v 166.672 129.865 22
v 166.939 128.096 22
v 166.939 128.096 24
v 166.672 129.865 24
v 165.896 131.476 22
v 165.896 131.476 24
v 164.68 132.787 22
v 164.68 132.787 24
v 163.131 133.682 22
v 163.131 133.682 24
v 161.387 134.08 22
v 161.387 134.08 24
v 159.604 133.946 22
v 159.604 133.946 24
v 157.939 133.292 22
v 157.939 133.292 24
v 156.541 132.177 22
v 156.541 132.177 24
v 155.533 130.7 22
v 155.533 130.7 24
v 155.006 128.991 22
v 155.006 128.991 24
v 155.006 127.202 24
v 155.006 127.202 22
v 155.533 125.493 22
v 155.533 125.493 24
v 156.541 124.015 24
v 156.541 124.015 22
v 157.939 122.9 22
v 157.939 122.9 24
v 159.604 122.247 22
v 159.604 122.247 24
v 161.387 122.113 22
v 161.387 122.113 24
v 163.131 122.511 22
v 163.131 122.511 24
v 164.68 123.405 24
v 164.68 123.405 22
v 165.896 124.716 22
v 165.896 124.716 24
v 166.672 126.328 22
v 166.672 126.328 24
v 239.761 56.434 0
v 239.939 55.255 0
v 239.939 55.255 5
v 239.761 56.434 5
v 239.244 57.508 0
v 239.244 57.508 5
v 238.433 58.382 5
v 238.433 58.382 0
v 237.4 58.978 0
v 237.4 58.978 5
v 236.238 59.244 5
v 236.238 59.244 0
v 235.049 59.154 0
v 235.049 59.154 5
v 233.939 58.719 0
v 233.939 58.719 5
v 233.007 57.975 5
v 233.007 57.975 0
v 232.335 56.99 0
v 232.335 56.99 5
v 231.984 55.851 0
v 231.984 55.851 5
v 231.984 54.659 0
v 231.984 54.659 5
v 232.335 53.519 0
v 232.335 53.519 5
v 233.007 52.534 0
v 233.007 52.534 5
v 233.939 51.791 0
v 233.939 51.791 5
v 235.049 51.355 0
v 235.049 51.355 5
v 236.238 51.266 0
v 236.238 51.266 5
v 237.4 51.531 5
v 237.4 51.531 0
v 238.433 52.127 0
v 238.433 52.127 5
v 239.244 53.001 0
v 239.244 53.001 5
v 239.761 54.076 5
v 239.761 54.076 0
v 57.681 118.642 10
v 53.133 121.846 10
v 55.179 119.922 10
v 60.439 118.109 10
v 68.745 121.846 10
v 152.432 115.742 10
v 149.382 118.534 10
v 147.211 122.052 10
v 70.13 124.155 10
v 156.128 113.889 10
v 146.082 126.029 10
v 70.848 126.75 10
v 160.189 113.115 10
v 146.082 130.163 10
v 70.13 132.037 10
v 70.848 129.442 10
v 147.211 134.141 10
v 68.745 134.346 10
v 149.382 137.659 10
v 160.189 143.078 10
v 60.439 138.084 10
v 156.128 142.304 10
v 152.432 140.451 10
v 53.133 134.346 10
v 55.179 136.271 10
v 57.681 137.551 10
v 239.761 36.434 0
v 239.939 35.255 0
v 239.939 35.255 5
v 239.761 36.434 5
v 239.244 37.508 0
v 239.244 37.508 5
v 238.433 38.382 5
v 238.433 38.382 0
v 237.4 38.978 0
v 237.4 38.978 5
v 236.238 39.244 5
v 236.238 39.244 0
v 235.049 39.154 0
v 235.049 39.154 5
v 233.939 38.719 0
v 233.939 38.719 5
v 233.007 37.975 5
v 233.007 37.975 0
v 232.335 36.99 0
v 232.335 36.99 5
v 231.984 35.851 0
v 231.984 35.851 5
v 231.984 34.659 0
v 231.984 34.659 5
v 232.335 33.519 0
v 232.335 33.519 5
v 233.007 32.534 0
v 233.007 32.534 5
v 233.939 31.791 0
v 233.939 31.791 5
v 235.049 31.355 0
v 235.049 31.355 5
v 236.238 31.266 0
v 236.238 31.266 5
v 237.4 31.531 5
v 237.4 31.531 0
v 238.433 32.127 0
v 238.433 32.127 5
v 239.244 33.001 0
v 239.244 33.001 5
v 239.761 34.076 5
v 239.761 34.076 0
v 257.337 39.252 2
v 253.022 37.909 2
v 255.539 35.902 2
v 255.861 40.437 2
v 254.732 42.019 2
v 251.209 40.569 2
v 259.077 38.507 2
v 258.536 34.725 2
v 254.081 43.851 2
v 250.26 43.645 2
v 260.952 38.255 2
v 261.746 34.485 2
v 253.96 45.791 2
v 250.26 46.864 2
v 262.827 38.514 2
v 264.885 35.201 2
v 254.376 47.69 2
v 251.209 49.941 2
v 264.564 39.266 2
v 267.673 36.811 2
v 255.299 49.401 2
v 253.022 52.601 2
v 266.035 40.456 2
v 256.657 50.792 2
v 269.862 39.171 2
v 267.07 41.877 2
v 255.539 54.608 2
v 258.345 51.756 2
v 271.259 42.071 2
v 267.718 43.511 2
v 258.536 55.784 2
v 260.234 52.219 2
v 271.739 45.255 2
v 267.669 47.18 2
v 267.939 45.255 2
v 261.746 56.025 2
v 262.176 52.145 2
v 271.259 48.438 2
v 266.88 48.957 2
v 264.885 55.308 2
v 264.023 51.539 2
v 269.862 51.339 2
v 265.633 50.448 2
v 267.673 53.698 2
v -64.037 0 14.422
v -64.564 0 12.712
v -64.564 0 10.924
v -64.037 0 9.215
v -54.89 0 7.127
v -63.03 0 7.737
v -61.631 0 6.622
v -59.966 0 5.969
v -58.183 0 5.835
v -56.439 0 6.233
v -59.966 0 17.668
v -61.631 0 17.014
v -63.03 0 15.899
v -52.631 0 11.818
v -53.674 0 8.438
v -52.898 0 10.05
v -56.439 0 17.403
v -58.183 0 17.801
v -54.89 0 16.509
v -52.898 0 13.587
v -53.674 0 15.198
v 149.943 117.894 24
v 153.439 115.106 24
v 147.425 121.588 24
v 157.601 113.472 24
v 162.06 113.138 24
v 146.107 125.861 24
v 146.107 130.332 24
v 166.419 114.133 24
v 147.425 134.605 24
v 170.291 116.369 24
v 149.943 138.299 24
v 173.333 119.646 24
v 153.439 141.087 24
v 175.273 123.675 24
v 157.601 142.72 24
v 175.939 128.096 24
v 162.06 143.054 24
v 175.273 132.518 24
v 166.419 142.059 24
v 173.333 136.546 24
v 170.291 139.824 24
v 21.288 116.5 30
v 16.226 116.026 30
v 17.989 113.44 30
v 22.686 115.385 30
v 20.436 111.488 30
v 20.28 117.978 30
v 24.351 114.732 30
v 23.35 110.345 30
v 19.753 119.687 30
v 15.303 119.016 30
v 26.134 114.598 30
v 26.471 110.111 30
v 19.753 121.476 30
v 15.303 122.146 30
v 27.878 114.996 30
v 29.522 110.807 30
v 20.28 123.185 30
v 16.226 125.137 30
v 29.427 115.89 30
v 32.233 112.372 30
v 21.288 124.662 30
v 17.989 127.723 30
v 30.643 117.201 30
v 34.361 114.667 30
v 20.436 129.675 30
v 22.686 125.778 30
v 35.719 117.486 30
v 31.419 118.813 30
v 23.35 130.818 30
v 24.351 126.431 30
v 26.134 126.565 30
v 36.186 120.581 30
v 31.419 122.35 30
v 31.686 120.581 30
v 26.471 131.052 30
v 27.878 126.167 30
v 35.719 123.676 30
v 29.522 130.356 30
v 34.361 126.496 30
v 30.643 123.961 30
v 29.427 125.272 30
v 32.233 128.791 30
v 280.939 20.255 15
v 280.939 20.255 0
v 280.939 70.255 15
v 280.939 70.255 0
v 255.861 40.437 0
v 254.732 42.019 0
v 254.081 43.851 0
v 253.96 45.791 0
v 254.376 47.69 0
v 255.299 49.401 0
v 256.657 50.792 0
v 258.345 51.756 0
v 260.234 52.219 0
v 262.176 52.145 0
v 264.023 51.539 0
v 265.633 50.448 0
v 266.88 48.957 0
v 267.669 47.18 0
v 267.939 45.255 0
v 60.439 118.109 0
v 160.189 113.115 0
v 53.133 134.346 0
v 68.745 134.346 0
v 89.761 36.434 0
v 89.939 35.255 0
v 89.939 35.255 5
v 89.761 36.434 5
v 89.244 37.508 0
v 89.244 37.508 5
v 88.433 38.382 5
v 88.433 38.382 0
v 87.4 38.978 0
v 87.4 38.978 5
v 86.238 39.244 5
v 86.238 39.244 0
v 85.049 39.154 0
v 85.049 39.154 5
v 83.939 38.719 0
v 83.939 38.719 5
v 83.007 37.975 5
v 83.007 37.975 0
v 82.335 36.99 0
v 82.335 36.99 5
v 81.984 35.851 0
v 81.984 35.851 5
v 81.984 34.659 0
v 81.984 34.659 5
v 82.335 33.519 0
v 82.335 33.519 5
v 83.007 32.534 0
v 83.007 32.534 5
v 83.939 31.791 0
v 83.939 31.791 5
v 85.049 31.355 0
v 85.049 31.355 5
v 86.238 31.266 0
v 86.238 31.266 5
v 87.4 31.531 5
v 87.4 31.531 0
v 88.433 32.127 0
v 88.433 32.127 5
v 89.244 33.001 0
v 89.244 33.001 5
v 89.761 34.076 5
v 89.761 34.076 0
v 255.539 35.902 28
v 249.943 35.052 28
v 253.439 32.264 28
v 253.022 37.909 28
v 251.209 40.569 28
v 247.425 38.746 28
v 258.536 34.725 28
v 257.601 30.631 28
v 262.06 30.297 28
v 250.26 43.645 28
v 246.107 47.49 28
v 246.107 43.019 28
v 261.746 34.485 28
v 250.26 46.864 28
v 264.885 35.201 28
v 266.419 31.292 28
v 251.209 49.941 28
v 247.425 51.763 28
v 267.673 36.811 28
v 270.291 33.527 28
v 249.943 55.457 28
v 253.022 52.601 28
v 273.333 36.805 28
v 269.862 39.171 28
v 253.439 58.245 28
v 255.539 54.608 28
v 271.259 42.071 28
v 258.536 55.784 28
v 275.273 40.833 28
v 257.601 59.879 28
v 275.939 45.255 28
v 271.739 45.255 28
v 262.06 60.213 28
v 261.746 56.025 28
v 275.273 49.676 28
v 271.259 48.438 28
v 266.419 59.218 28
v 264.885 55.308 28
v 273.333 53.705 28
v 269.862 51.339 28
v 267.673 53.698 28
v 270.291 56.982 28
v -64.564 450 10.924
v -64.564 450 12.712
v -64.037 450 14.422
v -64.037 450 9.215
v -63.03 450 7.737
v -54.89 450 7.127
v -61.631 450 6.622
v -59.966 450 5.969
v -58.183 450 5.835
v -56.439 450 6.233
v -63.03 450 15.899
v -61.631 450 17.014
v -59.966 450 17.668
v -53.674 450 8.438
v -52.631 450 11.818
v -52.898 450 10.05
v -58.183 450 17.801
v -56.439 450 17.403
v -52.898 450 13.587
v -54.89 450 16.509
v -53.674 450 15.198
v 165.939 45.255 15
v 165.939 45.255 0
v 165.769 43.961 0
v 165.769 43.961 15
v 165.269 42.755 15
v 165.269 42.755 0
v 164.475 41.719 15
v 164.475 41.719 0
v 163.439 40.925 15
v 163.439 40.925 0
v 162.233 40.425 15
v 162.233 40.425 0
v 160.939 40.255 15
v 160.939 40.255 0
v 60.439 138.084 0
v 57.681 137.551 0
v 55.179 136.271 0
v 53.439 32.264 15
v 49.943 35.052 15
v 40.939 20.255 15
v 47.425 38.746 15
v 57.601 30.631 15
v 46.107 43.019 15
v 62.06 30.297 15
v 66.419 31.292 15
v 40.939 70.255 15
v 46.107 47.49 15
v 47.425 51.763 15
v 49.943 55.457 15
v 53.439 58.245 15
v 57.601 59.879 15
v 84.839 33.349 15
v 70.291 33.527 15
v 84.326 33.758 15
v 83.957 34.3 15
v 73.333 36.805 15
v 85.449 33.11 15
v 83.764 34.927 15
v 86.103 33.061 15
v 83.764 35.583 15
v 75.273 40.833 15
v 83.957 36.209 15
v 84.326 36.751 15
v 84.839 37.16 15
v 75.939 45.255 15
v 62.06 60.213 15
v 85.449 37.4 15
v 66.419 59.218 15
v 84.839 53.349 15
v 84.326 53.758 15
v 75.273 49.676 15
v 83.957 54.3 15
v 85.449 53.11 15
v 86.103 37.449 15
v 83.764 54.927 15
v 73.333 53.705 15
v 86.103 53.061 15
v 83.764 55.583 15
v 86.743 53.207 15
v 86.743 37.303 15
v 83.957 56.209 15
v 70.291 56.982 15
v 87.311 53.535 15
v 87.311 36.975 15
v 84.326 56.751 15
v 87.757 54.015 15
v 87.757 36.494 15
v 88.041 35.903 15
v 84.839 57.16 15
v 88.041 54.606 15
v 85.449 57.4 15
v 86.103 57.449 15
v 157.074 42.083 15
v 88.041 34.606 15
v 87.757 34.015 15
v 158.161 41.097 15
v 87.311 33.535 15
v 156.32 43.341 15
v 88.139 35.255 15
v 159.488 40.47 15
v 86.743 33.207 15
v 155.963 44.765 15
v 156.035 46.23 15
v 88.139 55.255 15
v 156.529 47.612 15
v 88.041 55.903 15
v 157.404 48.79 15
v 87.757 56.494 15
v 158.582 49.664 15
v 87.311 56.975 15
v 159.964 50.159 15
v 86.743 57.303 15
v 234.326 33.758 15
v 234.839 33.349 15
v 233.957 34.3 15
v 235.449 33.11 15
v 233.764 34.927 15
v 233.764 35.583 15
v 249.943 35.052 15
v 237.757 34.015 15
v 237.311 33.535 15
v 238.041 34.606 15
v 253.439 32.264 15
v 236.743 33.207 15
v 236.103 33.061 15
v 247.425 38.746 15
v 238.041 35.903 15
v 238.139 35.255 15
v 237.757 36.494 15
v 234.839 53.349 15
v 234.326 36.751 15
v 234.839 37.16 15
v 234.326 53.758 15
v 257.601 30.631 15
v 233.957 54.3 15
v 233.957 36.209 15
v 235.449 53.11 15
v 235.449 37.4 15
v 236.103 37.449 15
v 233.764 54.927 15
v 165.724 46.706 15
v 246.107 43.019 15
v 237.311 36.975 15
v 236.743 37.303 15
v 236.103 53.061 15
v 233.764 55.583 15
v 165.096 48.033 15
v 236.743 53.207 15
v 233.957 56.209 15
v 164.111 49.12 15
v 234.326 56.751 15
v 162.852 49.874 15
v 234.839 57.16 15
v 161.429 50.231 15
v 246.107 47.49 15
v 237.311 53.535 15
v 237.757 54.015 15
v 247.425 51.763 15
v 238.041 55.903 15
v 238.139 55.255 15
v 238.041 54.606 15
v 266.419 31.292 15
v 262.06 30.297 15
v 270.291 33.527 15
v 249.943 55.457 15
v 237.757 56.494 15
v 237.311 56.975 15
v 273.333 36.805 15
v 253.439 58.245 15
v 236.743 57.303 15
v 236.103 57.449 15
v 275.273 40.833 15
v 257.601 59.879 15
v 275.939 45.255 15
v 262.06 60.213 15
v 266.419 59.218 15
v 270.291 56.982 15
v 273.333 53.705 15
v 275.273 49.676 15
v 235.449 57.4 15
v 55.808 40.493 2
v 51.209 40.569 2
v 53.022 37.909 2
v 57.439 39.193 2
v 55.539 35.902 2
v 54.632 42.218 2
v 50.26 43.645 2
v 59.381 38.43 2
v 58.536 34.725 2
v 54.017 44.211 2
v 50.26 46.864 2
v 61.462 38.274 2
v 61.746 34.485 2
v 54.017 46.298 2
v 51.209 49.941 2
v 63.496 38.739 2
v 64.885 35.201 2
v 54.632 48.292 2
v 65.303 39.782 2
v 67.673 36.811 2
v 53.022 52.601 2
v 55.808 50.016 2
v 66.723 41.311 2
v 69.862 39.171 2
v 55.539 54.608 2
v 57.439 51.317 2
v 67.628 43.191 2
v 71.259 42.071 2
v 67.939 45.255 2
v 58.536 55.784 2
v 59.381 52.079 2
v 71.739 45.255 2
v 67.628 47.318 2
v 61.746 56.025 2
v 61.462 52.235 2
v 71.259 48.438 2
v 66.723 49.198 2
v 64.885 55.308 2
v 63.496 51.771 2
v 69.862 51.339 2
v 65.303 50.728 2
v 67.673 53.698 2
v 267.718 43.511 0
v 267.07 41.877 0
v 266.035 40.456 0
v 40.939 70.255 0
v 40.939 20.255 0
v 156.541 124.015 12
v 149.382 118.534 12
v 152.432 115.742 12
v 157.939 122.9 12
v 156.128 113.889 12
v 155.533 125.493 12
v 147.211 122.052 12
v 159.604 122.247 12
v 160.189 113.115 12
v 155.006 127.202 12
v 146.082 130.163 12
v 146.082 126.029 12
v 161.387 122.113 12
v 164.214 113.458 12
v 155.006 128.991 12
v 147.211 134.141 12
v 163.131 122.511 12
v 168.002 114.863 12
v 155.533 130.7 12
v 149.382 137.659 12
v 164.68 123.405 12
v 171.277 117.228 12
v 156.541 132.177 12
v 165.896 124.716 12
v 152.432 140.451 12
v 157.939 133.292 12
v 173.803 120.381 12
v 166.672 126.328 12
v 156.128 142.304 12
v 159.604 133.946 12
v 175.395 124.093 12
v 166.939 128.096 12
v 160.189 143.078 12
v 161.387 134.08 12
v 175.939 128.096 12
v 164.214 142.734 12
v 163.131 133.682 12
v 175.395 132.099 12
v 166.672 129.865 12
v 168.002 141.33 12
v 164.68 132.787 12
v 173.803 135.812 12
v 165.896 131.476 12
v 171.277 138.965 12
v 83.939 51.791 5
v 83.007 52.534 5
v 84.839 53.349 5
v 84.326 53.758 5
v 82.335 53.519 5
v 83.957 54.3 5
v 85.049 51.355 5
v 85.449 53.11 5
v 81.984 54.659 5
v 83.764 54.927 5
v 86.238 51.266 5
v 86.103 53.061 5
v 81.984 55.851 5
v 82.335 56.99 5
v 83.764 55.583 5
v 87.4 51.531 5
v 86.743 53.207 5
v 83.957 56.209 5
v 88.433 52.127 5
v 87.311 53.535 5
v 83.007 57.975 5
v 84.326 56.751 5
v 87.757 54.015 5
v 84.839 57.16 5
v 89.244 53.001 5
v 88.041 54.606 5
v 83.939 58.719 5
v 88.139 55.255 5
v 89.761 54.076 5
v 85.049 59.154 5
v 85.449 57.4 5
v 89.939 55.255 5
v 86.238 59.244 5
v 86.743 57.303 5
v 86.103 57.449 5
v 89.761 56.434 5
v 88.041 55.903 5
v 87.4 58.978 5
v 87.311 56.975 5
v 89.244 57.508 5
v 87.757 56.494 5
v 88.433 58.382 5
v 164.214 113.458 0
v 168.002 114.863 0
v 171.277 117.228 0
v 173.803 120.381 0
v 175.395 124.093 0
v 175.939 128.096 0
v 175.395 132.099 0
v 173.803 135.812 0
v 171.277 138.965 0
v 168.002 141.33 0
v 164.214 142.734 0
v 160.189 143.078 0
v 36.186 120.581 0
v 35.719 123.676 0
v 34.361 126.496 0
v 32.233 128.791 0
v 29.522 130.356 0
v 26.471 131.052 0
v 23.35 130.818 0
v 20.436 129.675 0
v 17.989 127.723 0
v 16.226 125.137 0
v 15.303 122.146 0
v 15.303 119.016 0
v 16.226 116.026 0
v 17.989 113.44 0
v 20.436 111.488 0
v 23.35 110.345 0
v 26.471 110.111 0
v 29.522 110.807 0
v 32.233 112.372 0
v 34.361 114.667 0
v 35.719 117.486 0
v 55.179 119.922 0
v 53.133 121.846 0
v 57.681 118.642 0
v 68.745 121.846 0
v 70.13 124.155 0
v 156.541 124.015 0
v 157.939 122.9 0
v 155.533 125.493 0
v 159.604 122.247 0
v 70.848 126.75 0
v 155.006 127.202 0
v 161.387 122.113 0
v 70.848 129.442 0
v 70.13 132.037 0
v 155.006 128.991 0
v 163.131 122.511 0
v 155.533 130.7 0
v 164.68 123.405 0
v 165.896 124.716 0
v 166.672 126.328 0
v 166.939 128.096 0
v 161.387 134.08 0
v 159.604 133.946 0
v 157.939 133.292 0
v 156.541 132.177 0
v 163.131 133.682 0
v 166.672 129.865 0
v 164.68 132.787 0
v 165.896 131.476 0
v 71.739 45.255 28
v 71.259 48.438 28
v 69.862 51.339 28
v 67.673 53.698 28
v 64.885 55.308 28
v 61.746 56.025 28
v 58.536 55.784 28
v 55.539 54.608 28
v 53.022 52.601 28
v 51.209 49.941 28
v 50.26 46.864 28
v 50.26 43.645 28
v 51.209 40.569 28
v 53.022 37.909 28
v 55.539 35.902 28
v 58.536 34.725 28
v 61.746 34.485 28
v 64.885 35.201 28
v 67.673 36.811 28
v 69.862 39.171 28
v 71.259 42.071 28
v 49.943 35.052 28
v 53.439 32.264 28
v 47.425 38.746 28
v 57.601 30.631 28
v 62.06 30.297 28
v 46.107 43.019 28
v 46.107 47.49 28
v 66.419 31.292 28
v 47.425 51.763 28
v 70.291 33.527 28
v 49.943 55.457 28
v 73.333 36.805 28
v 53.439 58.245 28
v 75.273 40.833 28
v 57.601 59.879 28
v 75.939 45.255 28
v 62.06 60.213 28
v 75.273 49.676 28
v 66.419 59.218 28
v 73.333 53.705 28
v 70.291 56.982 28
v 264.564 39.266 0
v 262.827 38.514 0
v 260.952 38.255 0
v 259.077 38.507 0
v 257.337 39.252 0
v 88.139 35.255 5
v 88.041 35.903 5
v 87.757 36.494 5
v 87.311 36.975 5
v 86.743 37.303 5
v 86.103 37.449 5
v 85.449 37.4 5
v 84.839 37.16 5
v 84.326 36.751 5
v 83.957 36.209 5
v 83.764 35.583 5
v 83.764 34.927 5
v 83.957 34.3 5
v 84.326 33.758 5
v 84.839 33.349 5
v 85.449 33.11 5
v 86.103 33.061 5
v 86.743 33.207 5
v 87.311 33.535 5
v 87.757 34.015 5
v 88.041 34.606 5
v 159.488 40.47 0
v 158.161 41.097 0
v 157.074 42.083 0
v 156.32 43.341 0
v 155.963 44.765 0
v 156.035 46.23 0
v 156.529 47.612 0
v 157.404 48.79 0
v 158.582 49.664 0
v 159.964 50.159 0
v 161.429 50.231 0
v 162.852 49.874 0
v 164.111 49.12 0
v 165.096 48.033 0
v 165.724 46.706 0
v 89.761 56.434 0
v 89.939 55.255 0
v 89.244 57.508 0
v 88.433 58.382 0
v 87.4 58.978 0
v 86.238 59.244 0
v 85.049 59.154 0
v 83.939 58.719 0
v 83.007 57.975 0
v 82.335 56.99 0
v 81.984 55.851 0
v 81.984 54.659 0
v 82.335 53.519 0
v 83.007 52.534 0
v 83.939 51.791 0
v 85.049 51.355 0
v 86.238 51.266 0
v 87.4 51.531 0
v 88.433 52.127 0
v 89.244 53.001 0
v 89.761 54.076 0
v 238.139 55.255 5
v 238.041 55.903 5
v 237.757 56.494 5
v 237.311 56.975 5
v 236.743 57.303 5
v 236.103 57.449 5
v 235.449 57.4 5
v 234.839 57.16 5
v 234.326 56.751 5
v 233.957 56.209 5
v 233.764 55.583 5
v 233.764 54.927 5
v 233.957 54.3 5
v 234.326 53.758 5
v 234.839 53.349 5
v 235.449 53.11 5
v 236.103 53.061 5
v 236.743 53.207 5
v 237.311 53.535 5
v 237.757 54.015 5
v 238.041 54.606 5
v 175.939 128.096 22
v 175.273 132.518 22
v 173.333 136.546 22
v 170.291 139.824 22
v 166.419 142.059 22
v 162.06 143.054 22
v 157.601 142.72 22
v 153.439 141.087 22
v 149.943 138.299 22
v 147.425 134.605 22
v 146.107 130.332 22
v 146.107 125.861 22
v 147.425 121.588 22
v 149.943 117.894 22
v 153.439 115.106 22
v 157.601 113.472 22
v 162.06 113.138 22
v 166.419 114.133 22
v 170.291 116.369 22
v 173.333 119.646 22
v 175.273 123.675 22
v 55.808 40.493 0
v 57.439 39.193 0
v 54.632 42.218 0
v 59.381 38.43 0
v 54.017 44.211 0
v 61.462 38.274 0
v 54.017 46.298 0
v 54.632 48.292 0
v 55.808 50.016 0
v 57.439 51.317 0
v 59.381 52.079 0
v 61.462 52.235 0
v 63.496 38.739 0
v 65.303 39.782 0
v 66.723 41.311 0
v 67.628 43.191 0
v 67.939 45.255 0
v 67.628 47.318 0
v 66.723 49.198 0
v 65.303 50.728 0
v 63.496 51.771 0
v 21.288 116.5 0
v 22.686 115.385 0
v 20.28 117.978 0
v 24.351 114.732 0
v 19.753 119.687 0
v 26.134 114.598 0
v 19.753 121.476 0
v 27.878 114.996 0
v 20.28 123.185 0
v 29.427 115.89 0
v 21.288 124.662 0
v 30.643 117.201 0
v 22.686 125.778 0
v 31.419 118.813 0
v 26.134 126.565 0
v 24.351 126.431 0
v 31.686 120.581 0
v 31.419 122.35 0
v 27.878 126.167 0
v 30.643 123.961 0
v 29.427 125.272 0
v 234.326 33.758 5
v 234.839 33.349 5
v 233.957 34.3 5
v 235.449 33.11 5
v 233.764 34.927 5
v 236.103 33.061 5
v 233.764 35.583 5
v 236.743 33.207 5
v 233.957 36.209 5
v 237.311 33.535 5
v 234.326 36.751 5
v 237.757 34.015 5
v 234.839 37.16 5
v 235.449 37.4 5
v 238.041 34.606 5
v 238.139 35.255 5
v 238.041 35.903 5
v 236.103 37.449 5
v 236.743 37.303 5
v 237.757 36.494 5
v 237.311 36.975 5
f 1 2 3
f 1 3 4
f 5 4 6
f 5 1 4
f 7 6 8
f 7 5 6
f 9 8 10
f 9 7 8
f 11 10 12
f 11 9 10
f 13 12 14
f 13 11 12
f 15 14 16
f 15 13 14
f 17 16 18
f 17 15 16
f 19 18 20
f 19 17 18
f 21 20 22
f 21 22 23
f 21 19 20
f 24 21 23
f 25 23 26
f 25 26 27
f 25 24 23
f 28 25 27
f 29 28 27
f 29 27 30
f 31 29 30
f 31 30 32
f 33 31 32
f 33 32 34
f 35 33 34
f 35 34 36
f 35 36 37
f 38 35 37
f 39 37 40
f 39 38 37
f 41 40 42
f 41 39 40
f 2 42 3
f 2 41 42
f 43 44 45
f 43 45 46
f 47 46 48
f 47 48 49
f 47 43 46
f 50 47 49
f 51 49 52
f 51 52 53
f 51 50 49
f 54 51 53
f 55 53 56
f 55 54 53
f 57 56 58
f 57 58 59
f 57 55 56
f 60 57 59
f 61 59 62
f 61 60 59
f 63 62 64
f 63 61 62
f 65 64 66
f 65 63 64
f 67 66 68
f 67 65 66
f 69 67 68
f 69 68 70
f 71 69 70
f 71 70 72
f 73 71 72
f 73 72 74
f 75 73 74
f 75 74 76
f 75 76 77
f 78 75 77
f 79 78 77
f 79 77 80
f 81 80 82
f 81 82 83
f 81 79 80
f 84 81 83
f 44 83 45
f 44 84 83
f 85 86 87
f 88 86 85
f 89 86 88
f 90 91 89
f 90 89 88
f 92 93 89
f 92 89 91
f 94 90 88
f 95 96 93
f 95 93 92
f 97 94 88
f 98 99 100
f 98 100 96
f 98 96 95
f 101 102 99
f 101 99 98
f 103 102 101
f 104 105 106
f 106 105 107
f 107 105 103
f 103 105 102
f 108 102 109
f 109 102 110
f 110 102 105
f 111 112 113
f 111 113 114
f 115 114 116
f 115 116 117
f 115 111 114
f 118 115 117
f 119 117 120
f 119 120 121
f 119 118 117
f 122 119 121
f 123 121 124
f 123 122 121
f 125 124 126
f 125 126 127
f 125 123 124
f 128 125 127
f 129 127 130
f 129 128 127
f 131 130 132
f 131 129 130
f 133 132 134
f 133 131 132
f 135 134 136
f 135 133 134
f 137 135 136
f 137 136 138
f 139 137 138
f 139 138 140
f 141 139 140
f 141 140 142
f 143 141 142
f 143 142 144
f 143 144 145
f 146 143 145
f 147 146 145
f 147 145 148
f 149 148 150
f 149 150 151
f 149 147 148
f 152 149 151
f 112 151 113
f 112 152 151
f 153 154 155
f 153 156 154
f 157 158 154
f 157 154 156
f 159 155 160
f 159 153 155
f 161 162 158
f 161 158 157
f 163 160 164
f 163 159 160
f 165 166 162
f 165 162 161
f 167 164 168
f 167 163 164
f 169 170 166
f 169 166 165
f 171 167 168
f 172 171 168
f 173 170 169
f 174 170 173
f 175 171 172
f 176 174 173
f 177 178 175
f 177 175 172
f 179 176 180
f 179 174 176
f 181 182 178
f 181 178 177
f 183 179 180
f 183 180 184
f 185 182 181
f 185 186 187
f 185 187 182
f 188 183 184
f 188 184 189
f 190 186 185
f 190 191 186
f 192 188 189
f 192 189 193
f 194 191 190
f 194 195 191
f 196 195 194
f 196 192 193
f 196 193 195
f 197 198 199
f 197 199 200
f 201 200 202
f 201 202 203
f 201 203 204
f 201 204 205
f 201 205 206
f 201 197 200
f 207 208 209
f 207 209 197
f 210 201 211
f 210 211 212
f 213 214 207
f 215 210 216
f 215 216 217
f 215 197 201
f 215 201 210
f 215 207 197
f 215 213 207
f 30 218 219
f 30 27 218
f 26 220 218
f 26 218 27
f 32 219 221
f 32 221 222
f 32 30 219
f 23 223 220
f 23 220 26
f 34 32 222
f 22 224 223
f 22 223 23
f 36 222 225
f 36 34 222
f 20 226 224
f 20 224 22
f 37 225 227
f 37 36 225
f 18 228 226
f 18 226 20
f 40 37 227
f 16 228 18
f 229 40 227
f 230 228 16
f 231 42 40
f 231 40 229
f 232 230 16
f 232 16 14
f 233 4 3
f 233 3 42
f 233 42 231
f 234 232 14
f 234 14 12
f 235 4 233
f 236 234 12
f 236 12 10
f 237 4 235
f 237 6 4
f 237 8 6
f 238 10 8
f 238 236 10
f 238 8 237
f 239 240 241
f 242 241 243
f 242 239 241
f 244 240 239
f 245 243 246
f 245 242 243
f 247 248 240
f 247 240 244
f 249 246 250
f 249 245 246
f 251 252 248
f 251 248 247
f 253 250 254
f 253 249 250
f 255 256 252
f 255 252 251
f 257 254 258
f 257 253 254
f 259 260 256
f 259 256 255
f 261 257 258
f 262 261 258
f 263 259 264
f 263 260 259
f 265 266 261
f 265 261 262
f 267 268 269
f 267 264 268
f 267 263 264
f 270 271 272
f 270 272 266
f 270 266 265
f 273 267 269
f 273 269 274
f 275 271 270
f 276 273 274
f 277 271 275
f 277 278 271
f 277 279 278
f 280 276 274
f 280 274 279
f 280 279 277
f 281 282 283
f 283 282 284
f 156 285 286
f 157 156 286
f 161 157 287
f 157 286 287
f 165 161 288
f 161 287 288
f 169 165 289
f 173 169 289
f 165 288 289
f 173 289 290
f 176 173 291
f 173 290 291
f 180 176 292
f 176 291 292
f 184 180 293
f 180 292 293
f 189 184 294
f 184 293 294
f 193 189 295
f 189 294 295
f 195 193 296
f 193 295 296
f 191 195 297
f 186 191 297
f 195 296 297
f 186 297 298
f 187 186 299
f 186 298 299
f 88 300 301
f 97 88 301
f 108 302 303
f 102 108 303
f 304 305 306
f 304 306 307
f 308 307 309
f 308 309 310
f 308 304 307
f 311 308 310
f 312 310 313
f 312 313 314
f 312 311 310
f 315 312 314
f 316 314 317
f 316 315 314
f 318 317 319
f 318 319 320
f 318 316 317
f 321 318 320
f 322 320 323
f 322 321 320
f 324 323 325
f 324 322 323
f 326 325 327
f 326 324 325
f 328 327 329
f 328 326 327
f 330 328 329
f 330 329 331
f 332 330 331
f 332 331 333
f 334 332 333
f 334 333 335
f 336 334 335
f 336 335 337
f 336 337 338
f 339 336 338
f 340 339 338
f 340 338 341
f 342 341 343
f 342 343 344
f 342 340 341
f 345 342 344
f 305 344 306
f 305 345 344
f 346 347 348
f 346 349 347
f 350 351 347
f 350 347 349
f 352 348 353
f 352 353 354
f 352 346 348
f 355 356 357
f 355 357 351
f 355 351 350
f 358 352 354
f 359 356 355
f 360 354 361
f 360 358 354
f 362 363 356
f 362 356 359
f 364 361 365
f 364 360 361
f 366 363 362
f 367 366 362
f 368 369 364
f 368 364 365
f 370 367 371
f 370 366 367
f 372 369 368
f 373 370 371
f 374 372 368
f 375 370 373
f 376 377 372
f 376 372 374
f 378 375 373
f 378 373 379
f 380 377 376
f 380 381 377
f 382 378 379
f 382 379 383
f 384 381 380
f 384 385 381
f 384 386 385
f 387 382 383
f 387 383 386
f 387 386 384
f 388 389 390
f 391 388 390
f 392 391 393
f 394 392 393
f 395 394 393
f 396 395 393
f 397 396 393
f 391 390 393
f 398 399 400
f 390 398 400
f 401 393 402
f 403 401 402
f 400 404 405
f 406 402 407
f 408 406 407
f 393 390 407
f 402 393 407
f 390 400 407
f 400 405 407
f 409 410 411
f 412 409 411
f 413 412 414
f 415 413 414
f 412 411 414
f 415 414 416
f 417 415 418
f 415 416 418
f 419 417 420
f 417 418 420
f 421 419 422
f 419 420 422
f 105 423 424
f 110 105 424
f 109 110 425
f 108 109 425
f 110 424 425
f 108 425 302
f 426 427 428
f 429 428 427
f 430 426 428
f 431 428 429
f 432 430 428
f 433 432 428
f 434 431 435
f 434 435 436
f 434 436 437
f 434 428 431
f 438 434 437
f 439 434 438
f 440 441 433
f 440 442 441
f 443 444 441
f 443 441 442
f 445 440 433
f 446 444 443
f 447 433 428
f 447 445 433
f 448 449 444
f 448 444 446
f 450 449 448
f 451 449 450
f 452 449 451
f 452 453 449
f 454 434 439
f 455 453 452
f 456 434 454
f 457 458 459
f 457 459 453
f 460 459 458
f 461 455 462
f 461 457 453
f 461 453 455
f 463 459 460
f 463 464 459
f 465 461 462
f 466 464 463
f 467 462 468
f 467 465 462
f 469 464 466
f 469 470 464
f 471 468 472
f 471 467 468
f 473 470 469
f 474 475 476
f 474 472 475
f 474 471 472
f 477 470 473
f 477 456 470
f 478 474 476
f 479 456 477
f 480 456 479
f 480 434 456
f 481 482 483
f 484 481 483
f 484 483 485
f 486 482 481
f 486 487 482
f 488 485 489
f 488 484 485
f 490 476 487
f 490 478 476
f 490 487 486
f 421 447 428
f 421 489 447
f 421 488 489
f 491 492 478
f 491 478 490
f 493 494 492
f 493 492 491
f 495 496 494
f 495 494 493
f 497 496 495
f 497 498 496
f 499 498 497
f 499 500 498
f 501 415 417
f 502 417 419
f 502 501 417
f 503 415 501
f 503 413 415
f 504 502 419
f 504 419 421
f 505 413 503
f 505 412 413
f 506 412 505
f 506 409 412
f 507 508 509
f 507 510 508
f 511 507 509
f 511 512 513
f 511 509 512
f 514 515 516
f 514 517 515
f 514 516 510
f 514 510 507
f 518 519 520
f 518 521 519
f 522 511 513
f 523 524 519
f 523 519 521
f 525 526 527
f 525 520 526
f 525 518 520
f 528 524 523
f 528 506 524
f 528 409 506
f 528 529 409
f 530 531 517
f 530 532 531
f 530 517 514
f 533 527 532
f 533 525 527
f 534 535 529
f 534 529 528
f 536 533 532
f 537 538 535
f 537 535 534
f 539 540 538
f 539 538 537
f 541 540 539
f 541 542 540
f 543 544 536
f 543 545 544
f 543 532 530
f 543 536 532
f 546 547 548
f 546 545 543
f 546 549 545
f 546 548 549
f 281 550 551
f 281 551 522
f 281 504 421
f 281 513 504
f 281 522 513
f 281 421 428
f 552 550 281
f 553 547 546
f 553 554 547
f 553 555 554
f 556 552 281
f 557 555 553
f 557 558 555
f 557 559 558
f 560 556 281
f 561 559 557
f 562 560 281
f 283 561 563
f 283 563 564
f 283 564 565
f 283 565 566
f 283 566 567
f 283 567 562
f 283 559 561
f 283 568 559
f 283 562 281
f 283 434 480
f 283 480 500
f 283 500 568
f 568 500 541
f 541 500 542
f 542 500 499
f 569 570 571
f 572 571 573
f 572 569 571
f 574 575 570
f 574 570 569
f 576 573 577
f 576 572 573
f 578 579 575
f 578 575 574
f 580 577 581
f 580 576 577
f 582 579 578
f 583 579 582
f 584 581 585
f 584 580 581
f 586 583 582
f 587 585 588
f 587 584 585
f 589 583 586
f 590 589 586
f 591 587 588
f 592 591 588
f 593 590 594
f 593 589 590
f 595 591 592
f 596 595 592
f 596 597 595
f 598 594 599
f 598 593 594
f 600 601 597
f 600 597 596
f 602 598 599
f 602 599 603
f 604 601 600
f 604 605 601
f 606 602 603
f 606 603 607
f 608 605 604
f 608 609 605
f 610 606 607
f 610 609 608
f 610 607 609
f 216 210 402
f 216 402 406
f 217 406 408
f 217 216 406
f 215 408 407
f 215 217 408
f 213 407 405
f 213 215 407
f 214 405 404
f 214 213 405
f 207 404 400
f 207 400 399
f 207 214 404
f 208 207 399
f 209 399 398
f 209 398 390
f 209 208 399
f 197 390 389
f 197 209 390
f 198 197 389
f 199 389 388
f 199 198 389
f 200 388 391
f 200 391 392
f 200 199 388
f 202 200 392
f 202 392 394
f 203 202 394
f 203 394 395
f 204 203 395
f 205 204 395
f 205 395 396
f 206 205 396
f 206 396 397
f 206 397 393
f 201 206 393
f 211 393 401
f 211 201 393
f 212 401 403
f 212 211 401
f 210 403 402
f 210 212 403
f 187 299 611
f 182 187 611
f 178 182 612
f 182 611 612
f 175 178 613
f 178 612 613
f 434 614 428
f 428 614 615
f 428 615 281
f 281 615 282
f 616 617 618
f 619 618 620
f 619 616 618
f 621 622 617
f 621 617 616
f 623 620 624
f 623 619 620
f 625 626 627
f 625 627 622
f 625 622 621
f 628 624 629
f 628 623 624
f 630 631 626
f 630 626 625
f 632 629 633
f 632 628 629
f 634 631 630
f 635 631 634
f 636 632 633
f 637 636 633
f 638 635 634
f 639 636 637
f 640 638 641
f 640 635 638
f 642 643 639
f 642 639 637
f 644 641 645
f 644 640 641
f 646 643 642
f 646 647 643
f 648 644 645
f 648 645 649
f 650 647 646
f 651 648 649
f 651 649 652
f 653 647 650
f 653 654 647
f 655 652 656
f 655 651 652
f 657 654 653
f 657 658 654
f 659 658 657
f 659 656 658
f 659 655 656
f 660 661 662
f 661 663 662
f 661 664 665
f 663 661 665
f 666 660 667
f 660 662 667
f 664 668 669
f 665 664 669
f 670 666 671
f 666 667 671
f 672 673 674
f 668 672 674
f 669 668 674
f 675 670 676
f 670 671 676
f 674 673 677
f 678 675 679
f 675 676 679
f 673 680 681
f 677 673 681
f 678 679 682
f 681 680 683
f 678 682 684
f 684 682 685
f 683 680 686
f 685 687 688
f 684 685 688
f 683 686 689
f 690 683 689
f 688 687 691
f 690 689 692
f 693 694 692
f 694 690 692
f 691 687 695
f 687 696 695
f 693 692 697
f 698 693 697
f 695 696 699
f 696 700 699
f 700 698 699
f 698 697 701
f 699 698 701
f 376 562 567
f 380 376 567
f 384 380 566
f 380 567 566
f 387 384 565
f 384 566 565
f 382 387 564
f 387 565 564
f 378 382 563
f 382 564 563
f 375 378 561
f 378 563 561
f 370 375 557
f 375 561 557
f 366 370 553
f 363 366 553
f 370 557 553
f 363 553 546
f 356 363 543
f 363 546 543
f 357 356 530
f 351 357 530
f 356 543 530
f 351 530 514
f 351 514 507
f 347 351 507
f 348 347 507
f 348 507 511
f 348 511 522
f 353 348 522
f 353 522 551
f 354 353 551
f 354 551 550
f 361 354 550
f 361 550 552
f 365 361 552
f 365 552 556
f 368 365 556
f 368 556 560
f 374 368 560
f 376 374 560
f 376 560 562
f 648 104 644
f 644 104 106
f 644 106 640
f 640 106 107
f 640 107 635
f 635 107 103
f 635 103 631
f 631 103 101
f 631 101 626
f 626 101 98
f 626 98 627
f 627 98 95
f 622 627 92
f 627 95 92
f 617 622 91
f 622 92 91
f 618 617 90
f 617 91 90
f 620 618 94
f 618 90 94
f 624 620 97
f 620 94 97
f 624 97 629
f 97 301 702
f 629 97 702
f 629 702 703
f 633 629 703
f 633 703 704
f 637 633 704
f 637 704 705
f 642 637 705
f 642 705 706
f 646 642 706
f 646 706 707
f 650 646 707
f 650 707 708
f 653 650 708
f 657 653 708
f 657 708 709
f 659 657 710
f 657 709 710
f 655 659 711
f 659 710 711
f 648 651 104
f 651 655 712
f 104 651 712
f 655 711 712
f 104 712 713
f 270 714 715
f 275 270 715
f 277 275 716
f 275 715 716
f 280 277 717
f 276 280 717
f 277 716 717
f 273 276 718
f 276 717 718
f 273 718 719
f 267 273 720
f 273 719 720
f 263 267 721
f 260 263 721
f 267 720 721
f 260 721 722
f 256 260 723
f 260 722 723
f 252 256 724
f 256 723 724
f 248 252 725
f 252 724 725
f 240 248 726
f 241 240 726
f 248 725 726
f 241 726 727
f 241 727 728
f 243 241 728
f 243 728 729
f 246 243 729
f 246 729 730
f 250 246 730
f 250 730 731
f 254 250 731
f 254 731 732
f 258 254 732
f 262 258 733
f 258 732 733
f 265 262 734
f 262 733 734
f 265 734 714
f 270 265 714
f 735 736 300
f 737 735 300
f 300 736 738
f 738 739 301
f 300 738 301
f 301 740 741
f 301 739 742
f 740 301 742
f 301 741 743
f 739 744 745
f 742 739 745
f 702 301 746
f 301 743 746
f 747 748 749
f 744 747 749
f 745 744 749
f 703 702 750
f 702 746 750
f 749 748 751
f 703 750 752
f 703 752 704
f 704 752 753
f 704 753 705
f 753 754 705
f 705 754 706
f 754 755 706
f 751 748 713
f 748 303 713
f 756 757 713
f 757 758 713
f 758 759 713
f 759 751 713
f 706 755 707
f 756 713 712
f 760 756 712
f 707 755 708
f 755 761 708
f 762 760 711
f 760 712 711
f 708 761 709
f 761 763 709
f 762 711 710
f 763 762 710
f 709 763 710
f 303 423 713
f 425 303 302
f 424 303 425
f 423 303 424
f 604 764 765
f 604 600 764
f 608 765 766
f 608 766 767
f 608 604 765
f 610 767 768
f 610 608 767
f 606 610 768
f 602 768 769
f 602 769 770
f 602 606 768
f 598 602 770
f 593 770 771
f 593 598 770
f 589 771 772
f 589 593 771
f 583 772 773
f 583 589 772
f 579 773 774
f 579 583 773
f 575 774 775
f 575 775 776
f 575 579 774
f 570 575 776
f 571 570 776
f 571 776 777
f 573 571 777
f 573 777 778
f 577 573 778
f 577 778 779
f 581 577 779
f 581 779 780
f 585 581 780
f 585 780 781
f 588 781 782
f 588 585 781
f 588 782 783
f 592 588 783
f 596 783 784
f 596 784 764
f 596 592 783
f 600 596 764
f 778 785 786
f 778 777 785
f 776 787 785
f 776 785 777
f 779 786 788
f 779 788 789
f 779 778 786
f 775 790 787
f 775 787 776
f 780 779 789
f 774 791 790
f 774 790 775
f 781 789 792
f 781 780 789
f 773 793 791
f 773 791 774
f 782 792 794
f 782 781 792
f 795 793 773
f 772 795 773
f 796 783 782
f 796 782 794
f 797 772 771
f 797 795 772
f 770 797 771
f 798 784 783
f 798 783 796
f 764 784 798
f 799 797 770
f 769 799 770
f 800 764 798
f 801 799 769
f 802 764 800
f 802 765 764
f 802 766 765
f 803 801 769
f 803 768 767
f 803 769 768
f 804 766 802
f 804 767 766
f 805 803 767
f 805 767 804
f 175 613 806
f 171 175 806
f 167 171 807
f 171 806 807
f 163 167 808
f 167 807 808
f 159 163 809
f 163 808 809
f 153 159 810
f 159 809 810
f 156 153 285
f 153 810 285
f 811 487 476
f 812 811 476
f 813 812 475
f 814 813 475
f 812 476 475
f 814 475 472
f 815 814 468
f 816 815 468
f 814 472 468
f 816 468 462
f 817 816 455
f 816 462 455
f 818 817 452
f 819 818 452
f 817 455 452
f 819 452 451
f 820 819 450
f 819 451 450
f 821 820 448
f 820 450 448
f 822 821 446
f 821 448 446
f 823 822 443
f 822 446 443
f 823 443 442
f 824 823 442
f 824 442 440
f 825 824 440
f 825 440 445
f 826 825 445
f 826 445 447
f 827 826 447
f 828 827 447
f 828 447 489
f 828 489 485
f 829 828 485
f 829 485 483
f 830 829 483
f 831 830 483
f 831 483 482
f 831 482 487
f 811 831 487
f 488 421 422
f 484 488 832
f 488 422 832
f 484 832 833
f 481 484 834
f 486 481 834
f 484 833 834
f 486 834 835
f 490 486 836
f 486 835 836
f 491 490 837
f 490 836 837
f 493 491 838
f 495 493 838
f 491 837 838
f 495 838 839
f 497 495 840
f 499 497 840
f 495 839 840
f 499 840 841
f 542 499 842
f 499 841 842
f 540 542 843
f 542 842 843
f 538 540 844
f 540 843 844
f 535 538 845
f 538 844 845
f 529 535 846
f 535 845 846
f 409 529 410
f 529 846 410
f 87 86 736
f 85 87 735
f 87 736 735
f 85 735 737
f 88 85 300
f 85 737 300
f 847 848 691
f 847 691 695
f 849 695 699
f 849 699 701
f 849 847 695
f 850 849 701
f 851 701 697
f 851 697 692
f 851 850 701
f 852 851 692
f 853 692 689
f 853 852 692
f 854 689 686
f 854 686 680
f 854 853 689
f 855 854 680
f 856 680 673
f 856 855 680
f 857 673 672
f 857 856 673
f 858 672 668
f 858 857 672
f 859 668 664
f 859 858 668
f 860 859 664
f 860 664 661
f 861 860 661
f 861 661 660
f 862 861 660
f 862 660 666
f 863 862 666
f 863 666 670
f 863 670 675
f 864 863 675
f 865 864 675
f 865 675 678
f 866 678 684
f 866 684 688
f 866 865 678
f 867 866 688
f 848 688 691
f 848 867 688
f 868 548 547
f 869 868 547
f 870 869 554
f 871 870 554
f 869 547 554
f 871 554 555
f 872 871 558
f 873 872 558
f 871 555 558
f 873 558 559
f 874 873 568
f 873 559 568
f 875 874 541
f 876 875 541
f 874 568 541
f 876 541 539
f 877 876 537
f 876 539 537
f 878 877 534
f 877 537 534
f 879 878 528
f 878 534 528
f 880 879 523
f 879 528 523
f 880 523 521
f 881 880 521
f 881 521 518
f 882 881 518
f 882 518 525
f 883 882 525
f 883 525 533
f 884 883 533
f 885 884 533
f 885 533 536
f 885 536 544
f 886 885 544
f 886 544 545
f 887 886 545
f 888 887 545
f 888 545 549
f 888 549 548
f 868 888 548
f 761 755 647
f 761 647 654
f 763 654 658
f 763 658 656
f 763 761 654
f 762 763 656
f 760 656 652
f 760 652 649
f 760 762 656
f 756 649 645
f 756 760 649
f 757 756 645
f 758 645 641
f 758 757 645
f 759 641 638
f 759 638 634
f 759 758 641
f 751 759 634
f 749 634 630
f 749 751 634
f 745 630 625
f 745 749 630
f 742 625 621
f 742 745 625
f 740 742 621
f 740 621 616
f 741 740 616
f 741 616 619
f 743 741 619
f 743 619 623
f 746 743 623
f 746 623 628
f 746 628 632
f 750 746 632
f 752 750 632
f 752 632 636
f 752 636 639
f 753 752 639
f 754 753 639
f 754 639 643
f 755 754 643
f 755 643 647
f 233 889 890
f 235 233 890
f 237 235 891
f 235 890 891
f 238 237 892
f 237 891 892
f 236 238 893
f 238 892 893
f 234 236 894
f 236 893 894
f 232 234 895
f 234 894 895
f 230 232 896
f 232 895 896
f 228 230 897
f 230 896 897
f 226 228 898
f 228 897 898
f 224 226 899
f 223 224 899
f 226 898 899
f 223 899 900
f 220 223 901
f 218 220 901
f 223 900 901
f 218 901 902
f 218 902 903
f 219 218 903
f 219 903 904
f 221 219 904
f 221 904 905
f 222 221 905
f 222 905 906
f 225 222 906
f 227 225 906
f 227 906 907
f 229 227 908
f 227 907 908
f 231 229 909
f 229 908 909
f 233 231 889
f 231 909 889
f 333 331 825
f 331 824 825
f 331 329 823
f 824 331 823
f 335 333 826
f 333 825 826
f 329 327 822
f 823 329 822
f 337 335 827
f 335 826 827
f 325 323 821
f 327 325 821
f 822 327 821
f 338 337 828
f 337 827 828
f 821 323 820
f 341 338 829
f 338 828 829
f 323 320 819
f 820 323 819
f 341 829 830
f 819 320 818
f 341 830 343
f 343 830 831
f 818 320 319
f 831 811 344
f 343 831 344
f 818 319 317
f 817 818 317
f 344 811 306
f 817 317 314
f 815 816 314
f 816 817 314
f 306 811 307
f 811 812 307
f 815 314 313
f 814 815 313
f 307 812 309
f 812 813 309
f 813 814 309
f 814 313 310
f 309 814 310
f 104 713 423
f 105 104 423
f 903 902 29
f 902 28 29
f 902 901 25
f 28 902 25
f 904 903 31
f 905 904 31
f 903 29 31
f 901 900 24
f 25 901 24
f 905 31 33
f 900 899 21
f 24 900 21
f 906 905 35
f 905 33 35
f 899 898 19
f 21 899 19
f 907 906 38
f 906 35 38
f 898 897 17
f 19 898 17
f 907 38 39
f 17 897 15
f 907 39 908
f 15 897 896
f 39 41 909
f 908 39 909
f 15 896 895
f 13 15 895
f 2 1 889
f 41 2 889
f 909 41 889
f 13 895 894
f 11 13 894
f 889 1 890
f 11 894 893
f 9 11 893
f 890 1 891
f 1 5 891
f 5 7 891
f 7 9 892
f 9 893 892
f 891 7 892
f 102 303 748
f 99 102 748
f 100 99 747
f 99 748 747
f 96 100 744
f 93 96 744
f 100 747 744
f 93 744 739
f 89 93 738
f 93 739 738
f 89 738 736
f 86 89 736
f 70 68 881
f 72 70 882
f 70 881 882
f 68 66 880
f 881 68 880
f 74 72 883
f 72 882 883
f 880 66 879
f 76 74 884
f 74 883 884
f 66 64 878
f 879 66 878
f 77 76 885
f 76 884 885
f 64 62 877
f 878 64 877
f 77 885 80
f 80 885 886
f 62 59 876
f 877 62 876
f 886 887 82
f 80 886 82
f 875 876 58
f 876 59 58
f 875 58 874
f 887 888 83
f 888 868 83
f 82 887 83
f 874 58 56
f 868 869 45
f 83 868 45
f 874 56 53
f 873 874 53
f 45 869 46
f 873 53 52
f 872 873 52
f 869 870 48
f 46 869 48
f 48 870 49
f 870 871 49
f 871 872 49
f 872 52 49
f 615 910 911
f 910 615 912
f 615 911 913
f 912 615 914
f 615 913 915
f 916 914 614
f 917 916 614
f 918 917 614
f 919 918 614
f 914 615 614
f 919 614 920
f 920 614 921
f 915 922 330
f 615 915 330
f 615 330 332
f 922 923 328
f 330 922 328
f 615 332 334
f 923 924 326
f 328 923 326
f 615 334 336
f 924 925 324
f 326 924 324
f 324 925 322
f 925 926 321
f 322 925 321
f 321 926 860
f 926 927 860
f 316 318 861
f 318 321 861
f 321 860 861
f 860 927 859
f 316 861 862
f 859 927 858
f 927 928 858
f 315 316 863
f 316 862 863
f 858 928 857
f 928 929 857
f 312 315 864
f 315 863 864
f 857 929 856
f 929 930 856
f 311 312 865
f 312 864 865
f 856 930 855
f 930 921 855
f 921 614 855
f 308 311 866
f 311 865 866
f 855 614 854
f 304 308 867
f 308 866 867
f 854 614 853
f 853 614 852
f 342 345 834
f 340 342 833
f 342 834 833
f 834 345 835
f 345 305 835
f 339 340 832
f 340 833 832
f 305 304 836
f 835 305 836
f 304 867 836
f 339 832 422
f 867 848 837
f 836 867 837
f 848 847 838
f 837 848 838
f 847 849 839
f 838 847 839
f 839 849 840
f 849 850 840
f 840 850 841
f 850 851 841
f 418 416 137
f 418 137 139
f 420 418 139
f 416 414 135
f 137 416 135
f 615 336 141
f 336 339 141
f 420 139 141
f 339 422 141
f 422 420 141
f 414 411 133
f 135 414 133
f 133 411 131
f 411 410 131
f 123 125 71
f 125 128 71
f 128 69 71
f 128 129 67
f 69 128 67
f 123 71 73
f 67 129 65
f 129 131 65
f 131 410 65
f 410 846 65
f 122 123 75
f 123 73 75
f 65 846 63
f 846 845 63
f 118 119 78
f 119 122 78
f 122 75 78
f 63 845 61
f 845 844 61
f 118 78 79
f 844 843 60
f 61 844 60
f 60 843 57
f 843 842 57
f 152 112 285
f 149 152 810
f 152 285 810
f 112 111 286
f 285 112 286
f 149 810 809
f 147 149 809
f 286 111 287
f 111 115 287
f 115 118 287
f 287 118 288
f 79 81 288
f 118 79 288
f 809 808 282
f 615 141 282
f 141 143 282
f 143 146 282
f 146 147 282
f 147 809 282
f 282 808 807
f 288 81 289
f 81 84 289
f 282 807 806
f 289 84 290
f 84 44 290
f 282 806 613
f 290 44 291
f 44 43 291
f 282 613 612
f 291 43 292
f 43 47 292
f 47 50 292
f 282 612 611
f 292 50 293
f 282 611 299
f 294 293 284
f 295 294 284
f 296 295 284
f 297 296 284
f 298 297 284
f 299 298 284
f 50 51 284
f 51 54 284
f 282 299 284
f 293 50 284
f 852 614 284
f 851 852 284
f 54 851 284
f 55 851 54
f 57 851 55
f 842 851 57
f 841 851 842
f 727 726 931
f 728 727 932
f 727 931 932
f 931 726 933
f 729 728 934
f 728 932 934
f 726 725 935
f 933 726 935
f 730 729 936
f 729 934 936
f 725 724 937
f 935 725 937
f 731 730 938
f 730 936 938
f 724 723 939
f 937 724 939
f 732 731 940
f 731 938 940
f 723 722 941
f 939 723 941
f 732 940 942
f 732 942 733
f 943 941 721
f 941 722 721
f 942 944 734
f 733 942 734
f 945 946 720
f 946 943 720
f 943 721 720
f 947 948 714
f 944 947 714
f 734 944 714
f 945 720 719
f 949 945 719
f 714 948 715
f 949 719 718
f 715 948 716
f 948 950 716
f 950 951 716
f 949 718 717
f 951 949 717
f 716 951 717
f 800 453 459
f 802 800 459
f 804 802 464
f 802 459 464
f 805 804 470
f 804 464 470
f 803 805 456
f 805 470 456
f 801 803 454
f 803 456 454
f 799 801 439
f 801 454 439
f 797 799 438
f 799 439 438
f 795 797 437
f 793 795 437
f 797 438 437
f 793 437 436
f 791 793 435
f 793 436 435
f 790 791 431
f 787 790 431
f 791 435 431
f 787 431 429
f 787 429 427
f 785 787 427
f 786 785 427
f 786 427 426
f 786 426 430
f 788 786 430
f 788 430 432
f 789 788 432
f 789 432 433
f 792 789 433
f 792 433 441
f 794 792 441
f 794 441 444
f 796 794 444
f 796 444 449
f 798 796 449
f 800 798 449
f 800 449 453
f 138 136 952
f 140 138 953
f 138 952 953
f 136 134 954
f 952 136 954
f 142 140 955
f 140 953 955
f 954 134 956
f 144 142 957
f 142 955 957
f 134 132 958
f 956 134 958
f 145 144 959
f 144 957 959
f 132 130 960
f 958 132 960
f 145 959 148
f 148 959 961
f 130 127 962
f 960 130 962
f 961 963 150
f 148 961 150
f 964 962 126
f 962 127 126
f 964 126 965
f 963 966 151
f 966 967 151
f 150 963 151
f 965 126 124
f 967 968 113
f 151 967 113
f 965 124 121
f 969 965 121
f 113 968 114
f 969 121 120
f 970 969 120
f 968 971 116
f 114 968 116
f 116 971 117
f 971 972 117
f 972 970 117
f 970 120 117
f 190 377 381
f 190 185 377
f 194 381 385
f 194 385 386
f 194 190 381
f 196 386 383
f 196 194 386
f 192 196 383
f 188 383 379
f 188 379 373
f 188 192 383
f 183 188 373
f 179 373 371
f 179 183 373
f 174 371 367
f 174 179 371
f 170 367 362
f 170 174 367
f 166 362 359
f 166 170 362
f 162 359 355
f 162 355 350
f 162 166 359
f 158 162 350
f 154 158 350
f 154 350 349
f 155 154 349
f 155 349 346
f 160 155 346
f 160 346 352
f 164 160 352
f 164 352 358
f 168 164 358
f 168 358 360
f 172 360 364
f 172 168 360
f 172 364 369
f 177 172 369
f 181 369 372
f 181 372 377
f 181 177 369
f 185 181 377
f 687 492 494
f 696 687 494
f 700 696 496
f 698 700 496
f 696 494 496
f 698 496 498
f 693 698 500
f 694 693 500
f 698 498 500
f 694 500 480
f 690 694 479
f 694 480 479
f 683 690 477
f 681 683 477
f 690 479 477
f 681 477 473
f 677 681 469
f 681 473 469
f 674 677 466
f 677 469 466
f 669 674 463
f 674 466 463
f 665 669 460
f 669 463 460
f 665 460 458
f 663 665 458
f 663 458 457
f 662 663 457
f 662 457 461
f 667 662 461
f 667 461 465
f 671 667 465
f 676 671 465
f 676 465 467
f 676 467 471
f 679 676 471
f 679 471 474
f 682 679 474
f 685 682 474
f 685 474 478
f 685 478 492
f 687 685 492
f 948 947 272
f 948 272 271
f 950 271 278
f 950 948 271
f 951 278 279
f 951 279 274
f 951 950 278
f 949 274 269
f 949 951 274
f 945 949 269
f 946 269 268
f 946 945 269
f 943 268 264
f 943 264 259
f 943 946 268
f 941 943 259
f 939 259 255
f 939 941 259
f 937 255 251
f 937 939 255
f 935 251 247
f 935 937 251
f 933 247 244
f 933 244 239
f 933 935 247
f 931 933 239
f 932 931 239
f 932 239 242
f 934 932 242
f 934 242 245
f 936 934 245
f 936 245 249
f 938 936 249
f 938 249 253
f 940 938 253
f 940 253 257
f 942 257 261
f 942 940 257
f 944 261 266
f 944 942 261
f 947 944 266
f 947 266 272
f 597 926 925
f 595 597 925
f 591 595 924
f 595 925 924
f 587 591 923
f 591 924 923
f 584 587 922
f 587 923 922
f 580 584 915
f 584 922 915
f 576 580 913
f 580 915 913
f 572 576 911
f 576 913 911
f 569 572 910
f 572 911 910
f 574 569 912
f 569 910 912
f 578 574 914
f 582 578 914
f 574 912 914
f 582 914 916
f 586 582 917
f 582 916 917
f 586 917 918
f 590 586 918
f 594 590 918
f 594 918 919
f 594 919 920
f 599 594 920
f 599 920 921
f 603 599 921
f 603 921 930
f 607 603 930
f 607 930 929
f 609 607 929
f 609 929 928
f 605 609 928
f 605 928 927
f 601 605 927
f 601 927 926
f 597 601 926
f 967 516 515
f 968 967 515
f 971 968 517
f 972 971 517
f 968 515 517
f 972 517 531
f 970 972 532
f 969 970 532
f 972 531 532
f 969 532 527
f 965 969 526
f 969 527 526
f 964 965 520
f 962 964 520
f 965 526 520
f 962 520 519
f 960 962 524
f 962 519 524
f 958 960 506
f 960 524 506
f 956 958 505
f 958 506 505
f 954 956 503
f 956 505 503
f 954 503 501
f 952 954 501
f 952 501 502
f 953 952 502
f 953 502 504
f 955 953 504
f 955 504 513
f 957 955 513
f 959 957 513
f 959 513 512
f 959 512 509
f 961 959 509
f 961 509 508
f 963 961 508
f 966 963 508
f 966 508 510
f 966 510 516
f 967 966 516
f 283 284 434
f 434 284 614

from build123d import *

# Parameters (mm, degrees)
F0_R      = 6
F1_DEPTH  = 450
F3_DEPTH  = 15
F5_R      = 15
F5_R_2    = 10.8
F6_DEPTH  = 26
F7_DEPTH  = 25
F8_R      = 10.5
F8_R_2    = 6
F9_DEPTH  = 30
F10_R     = 6
F11_DEPTH = 10
F12_DEPTH = 12
F14_R     = 15
F14_R_2   = 6
F15_DEPTH = 2
F16_R     = 2.2
F17_DEPTH = 25
F18_R     = 4
F19_DEPTH = 5


with BuildPart() as f1:
    # F0 (on Front) → F1 (new body)
    with BuildSketch(Plane.XZ):
        with Locations((-58.6313195527, 11.818244122)):
            Circle(F0_R)
    extrude(amount=-F1_DEPTH)


with BuildPart() as f3:
    # F2 (on Top) → F3 (new body)
    with BuildSketch(Plane.XY):
        with BuildLine():
            Line((112.6172155437, 70.2547036733), (40.9390357137, 70.2547036733))
            Line((40.9390357137, 70.2547036733), (40.9390357137, 40.0247901491))
            Line((40.9390357137, 40.0247901491), (56.2535217803, 40.0541307068))
            ThreePointArc((56.2535217803, 40.0541307068), (58.0928626281, 51.6499596312), (67.9390357137, 45.2547036733))
            ThreePointArc((67.9390357137, 45.2547036733), (67.3397328209, 42.420788265), (65.6444424161, 40.0721224859))
            Line((65.6444424161, 40.0721224859), (112.6748688046, 40.1622266485))
            Line((112.6748688046, 40.1622266485), (112.6651122828, 45.2547036733))
            Line((112.6651122828, 45.2547036733), (112.6172155437, 70.2547036733))
        make_face()
        with BuildLine():
            Line((280.9390357137, 70.2547036733), (112.6172155437, 70.2547036733))
            Line((112.6172155437, 70.2547036733), (112.6651122828, 45.2547036733))
            Line((112.6651122828, 45.2547036733), (112.6748688046, 40.1622266485))
            Line((112.6748688046, 40.1622266485), (160.9390357137, 40.254694497))
            Line((160.9390357137, 40.254694497), (255.8611008882, 40.4365527927))
            ThreePointArc((255.8611008882, 40.4365527927), (258.3453456568, 51.7564551211), (267.9390357137, 45.2547036733))
            ThreePointArc((267.9390357137, 45.2547036733), (267.4457443917, 42.6734748615), (266.035395091, 40.4560454133))
            Line((266.035395091, 40.4560454133), (280.9390357137, 40.4845988448))
            Line((280.9390357137, 40.4845988448), (280.9390357137, 70.2547036733))
        make_face()
        with BuildLine():
            ThreePointArc((165.9390357137, 45.2547036733), (164.4745696196, 41.7191697674), (160.9390357137, 40.2547036733))
            ThreePointArc((160.9390357137, 40.2547036733), (157.4035018077, 48.7902375793), (165.9390357137, 45.2547036733))
        make_face(mode=Mode.SUBTRACT)
        with BuildLine():
            Line((56.2535217803, 40.0541307068), (40.9390357137, 40.0247901491))
            Line((40.9390357137, 40.0247901491), (40.9390357137, 20.2547036733))
            Line((40.9390357137, 20.2547036733), (112.713009022, 20.2547036733))
            Line((112.713009022, 20.2547036733), (112.6748688046, 40.1622266485))
            Line((112.6748688046, 40.1622266485), (65.6444424161, 40.0721224859))
            ThreePointArc((65.6444424161, 40.0721224859), (60.952446776, 38.2547165203), (56.2535217803, 40.0541307068))
        make_face()
        with BuildLine():
            Line((280.9390357137, 20.2547036733), (280.9390357137, 40.4845988448))
            Line((280.9390357137, 40.4845988448), (266.035395091, 40.4560454133))
            ThreePointArc((266.035395091, 40.4560454133), (260.952446776, 38.2547165203), (255.8611008882, 40.4365527927))
            Line((255.8611008882, 40.4365527927), (160.9390357137, 40.254694497))
            Line((160.9390357137, 40.254694497), (112.6748688046, 40.1622266485))
            Line((112.6748688046, 40.1622266485), (112.713009022, 20.2547036733))
            Line((112.713009022, 20.2547036733), (280.9390357137, 20.2547036733))
        make_face()
    extrude(amount=F3_DEPTH)

    # F5 (on offset) → F6 (join)
    with BuildSketch(Plane.XY.offset(2)):
        with Locations((60.9390357137, 45.2547036733)):
            Circle(F5_R)
        with Locations((60.9390357137, 45.2547036733)):
            Circle(F5_R_2, mode=Mode.SUBTRACT)
        with Locations((260.9390357137, 45.2547036733)):
            Circle(F5_R)
        with Locations((260.9390357137, 45.2547036733)):
            Circle(F5_R_2, mode=Mode.SUBTRACT)
    extrude(amount=F6_DEPTH)

    # F5 (on offset) → F7 (cut)
    with BuildSketch(Plane.XY.offset(2)):
        with Locations((260.9390357137, 45.2547036733)):
            Circle(F5_R_2)
        with Locations((60.9390357137, 45.2547036733)):
            Circle(F5_R_2)
    extrude(amount=F7_DEPTH, mode=Mode.SUBTRACT)

    # F16 (on face) → F17 (cut)
    with BuildSketch(Plane.XY.offset(15)):
        with Locations((85.9390357137, 55.2547036733)):
            Circle(F16_R)
        with Locations((85.9390357137, 35.2547036733)):
            Circle(F16_R)
        with Locations((235.9390357137, 55.2547036733)):
            Circle(F16_R)
        with Locations((235.9390357137, 35.2547036733)):
            Circle(F16_R)
    extrude(amount=-F17_DEPTH, mode=Mode.SUBTRACT)

    # F18 (on face) → F19 (cut)
    with BuildSketch(Plane.XY):
        with Locations((85.9390357137, 35.2547036733)):
            Circle(F18_R)
        with Locations((85.9390357137, 55.2547036733)):
            Circle(F18_R)
        with Locations((235.9390357137, 35.2547036733)):
            Circle(F18_R)
        with Locations((235.9390357137, 55.2547036733)):
            Circle(F18_R)
    extrude(amount=F19_DEPTH, mode=Mode.SUBTRACT)


with BuildPart() as f9:
    # F8 (on Top) → F9 (new body)
    with BuildSketch(Plane.XY):
        with Locations((25.685980916, 120.5813884735)):
            Circle(F8_R)
        with Locations((25.685980916, 120.5813884735)):
            Circle(F8_R_2, mode=Mode.SUBTRACT)
    extrude(amount=F9_DEPTH)


with BuildPart() as f11:
    # F10 (on Top) → F11 (new body)
    with BuildSketch(Plane.XY):
        with BuildLine():
            ThreePointArc((160.1890357137, 113.1150491054), (171.2770722777, 117.2277548123), (175.9390357137, 128.096287372))
            ThreePointArc((175.9390357137, 128.096287372), (171.2770722777, 138.9648199316), (160.1890357137, 143.0775256385))
            ThreePointArc((160.1890357137, 143.0775256385), (145.9390357137, 128.096287372), (160.1890357137, 113.1150491054))
        make_face()
        with Locations((160.9390357137, 128.096287372)):
            Circle(F10_R, mode=Mode.SUBTRACT)
        with BuildLine():
            ThreePointArc((160.1890357137, 113.1150491054), (145.9390357137, 128.096287372), (160.1890357137, 143.0775256385))
            Line((160.1890357137, 143.0775256385), (60.4390357137, 138.0837795497))
            ThreePointArc((60.4390357137, 138.0837795497), (65.0423910566, 137.2156335618), (68.7452832117, 134.346287372))
            Line((68.7452832117, 134.346287372), (75.4908919334, 134.346287372))
            Line((75.4908919334, 134.346287372), (75.4908919334, 121.846287372))
            Line((75.4908919334, 121.846287372), (68.7452832117, 121.846287372))
            ThreePointArc((68.7452832117, 121.846287372), (65.0423910566, 118.9769411821), (60.4390357137, 118.1087951942))
            Line((60.4390357137, 118.1087951942), (160.1890357137, 113.1150491054))
        make_face()
        with BuildLine():
            ThreePointArc((68.7452832117, 134.346287372), (65.0423910566, 137.2156335618), (60.4390357137, 138.0837795497))
            ThreePointArc((60.4390357137, 138.0837795497), (56.3848454652, 136.9990594785), (53.1327882157, 134.346287372))
            Line((53.1327882157, 134.346287372), (68.7452832117, 134.346287372))
        make_face()
        with BuildLine():
            ThreePointArc((53.1327882157, 121.846287372), (56.3848454652, 119.1935152654), (60.4390357137, 118.1087951942))
            ThreePointArc((60.4390357137, 118.1087951942), (65.0423910566, 118.9769411821), (68.7452832117, 121.846287372))
            Line((68.7452832117, 121.846287372), (53.1327882157, 121.846287372))
        make_face()
        with BuildLine():
            Line((75.4908919334, 134.346287372), (68.7452832117, 134.346287372))
            ThreePointArc((68.7452832117, 134.346287372), (70.9390357137, 128.096287372), (68.7452832117, 121.846287372))
            Line((68.7452832117, 121.846287372), (75.4908919334, 121.846287372))
            Line((75.4908919334, 121.846287372), (75.4908919334, 134.346287372))
        make_face()
    extrude(amount=F11_DEPTH)

    # F10 (on Top) → F12 (join)
    with BuildSketch(Plane.XY):
        with BuildLine():
            ThreePointArc((160.1890357137, 113.1150491054), (171.2770722777, 117.2277548123), (175.9390357137, 128.096287372))
            ThreePointArc((175.9390357137, 128.096287372), (171.2770722777, 138.9648199316), (160.1890357137, 143.0775256385))
            ThreePointArc((160.1890357137, 143.0775256385), (145.9390357137, 128.096287372), (160.1890357137, 113.1150491054))
        make_face()
        with Locations((160.9390357137, 128.096287372)):
            Circle(F10_R, mode=Mode.SUBTRACT)
    extrude(amount=F12_DEPTH)


with BuildPart() as f15:
    # F14 (on offset) → F15 (new body)
    with BuildSketch(Plane.XY.offset(22)):
        with Locations((160.9390357137, 128.096287372)):
            Circle(F14_R)
        with Locations((160.9390357137, 128.096287372)):
            Circle(F14_R_2, mode=Mode.SUBTRACT)
    extrude(amount=F15_DEPTH)


solid = Compound([f1.part, f3.part, f9.part, f11.part, f15.part])
